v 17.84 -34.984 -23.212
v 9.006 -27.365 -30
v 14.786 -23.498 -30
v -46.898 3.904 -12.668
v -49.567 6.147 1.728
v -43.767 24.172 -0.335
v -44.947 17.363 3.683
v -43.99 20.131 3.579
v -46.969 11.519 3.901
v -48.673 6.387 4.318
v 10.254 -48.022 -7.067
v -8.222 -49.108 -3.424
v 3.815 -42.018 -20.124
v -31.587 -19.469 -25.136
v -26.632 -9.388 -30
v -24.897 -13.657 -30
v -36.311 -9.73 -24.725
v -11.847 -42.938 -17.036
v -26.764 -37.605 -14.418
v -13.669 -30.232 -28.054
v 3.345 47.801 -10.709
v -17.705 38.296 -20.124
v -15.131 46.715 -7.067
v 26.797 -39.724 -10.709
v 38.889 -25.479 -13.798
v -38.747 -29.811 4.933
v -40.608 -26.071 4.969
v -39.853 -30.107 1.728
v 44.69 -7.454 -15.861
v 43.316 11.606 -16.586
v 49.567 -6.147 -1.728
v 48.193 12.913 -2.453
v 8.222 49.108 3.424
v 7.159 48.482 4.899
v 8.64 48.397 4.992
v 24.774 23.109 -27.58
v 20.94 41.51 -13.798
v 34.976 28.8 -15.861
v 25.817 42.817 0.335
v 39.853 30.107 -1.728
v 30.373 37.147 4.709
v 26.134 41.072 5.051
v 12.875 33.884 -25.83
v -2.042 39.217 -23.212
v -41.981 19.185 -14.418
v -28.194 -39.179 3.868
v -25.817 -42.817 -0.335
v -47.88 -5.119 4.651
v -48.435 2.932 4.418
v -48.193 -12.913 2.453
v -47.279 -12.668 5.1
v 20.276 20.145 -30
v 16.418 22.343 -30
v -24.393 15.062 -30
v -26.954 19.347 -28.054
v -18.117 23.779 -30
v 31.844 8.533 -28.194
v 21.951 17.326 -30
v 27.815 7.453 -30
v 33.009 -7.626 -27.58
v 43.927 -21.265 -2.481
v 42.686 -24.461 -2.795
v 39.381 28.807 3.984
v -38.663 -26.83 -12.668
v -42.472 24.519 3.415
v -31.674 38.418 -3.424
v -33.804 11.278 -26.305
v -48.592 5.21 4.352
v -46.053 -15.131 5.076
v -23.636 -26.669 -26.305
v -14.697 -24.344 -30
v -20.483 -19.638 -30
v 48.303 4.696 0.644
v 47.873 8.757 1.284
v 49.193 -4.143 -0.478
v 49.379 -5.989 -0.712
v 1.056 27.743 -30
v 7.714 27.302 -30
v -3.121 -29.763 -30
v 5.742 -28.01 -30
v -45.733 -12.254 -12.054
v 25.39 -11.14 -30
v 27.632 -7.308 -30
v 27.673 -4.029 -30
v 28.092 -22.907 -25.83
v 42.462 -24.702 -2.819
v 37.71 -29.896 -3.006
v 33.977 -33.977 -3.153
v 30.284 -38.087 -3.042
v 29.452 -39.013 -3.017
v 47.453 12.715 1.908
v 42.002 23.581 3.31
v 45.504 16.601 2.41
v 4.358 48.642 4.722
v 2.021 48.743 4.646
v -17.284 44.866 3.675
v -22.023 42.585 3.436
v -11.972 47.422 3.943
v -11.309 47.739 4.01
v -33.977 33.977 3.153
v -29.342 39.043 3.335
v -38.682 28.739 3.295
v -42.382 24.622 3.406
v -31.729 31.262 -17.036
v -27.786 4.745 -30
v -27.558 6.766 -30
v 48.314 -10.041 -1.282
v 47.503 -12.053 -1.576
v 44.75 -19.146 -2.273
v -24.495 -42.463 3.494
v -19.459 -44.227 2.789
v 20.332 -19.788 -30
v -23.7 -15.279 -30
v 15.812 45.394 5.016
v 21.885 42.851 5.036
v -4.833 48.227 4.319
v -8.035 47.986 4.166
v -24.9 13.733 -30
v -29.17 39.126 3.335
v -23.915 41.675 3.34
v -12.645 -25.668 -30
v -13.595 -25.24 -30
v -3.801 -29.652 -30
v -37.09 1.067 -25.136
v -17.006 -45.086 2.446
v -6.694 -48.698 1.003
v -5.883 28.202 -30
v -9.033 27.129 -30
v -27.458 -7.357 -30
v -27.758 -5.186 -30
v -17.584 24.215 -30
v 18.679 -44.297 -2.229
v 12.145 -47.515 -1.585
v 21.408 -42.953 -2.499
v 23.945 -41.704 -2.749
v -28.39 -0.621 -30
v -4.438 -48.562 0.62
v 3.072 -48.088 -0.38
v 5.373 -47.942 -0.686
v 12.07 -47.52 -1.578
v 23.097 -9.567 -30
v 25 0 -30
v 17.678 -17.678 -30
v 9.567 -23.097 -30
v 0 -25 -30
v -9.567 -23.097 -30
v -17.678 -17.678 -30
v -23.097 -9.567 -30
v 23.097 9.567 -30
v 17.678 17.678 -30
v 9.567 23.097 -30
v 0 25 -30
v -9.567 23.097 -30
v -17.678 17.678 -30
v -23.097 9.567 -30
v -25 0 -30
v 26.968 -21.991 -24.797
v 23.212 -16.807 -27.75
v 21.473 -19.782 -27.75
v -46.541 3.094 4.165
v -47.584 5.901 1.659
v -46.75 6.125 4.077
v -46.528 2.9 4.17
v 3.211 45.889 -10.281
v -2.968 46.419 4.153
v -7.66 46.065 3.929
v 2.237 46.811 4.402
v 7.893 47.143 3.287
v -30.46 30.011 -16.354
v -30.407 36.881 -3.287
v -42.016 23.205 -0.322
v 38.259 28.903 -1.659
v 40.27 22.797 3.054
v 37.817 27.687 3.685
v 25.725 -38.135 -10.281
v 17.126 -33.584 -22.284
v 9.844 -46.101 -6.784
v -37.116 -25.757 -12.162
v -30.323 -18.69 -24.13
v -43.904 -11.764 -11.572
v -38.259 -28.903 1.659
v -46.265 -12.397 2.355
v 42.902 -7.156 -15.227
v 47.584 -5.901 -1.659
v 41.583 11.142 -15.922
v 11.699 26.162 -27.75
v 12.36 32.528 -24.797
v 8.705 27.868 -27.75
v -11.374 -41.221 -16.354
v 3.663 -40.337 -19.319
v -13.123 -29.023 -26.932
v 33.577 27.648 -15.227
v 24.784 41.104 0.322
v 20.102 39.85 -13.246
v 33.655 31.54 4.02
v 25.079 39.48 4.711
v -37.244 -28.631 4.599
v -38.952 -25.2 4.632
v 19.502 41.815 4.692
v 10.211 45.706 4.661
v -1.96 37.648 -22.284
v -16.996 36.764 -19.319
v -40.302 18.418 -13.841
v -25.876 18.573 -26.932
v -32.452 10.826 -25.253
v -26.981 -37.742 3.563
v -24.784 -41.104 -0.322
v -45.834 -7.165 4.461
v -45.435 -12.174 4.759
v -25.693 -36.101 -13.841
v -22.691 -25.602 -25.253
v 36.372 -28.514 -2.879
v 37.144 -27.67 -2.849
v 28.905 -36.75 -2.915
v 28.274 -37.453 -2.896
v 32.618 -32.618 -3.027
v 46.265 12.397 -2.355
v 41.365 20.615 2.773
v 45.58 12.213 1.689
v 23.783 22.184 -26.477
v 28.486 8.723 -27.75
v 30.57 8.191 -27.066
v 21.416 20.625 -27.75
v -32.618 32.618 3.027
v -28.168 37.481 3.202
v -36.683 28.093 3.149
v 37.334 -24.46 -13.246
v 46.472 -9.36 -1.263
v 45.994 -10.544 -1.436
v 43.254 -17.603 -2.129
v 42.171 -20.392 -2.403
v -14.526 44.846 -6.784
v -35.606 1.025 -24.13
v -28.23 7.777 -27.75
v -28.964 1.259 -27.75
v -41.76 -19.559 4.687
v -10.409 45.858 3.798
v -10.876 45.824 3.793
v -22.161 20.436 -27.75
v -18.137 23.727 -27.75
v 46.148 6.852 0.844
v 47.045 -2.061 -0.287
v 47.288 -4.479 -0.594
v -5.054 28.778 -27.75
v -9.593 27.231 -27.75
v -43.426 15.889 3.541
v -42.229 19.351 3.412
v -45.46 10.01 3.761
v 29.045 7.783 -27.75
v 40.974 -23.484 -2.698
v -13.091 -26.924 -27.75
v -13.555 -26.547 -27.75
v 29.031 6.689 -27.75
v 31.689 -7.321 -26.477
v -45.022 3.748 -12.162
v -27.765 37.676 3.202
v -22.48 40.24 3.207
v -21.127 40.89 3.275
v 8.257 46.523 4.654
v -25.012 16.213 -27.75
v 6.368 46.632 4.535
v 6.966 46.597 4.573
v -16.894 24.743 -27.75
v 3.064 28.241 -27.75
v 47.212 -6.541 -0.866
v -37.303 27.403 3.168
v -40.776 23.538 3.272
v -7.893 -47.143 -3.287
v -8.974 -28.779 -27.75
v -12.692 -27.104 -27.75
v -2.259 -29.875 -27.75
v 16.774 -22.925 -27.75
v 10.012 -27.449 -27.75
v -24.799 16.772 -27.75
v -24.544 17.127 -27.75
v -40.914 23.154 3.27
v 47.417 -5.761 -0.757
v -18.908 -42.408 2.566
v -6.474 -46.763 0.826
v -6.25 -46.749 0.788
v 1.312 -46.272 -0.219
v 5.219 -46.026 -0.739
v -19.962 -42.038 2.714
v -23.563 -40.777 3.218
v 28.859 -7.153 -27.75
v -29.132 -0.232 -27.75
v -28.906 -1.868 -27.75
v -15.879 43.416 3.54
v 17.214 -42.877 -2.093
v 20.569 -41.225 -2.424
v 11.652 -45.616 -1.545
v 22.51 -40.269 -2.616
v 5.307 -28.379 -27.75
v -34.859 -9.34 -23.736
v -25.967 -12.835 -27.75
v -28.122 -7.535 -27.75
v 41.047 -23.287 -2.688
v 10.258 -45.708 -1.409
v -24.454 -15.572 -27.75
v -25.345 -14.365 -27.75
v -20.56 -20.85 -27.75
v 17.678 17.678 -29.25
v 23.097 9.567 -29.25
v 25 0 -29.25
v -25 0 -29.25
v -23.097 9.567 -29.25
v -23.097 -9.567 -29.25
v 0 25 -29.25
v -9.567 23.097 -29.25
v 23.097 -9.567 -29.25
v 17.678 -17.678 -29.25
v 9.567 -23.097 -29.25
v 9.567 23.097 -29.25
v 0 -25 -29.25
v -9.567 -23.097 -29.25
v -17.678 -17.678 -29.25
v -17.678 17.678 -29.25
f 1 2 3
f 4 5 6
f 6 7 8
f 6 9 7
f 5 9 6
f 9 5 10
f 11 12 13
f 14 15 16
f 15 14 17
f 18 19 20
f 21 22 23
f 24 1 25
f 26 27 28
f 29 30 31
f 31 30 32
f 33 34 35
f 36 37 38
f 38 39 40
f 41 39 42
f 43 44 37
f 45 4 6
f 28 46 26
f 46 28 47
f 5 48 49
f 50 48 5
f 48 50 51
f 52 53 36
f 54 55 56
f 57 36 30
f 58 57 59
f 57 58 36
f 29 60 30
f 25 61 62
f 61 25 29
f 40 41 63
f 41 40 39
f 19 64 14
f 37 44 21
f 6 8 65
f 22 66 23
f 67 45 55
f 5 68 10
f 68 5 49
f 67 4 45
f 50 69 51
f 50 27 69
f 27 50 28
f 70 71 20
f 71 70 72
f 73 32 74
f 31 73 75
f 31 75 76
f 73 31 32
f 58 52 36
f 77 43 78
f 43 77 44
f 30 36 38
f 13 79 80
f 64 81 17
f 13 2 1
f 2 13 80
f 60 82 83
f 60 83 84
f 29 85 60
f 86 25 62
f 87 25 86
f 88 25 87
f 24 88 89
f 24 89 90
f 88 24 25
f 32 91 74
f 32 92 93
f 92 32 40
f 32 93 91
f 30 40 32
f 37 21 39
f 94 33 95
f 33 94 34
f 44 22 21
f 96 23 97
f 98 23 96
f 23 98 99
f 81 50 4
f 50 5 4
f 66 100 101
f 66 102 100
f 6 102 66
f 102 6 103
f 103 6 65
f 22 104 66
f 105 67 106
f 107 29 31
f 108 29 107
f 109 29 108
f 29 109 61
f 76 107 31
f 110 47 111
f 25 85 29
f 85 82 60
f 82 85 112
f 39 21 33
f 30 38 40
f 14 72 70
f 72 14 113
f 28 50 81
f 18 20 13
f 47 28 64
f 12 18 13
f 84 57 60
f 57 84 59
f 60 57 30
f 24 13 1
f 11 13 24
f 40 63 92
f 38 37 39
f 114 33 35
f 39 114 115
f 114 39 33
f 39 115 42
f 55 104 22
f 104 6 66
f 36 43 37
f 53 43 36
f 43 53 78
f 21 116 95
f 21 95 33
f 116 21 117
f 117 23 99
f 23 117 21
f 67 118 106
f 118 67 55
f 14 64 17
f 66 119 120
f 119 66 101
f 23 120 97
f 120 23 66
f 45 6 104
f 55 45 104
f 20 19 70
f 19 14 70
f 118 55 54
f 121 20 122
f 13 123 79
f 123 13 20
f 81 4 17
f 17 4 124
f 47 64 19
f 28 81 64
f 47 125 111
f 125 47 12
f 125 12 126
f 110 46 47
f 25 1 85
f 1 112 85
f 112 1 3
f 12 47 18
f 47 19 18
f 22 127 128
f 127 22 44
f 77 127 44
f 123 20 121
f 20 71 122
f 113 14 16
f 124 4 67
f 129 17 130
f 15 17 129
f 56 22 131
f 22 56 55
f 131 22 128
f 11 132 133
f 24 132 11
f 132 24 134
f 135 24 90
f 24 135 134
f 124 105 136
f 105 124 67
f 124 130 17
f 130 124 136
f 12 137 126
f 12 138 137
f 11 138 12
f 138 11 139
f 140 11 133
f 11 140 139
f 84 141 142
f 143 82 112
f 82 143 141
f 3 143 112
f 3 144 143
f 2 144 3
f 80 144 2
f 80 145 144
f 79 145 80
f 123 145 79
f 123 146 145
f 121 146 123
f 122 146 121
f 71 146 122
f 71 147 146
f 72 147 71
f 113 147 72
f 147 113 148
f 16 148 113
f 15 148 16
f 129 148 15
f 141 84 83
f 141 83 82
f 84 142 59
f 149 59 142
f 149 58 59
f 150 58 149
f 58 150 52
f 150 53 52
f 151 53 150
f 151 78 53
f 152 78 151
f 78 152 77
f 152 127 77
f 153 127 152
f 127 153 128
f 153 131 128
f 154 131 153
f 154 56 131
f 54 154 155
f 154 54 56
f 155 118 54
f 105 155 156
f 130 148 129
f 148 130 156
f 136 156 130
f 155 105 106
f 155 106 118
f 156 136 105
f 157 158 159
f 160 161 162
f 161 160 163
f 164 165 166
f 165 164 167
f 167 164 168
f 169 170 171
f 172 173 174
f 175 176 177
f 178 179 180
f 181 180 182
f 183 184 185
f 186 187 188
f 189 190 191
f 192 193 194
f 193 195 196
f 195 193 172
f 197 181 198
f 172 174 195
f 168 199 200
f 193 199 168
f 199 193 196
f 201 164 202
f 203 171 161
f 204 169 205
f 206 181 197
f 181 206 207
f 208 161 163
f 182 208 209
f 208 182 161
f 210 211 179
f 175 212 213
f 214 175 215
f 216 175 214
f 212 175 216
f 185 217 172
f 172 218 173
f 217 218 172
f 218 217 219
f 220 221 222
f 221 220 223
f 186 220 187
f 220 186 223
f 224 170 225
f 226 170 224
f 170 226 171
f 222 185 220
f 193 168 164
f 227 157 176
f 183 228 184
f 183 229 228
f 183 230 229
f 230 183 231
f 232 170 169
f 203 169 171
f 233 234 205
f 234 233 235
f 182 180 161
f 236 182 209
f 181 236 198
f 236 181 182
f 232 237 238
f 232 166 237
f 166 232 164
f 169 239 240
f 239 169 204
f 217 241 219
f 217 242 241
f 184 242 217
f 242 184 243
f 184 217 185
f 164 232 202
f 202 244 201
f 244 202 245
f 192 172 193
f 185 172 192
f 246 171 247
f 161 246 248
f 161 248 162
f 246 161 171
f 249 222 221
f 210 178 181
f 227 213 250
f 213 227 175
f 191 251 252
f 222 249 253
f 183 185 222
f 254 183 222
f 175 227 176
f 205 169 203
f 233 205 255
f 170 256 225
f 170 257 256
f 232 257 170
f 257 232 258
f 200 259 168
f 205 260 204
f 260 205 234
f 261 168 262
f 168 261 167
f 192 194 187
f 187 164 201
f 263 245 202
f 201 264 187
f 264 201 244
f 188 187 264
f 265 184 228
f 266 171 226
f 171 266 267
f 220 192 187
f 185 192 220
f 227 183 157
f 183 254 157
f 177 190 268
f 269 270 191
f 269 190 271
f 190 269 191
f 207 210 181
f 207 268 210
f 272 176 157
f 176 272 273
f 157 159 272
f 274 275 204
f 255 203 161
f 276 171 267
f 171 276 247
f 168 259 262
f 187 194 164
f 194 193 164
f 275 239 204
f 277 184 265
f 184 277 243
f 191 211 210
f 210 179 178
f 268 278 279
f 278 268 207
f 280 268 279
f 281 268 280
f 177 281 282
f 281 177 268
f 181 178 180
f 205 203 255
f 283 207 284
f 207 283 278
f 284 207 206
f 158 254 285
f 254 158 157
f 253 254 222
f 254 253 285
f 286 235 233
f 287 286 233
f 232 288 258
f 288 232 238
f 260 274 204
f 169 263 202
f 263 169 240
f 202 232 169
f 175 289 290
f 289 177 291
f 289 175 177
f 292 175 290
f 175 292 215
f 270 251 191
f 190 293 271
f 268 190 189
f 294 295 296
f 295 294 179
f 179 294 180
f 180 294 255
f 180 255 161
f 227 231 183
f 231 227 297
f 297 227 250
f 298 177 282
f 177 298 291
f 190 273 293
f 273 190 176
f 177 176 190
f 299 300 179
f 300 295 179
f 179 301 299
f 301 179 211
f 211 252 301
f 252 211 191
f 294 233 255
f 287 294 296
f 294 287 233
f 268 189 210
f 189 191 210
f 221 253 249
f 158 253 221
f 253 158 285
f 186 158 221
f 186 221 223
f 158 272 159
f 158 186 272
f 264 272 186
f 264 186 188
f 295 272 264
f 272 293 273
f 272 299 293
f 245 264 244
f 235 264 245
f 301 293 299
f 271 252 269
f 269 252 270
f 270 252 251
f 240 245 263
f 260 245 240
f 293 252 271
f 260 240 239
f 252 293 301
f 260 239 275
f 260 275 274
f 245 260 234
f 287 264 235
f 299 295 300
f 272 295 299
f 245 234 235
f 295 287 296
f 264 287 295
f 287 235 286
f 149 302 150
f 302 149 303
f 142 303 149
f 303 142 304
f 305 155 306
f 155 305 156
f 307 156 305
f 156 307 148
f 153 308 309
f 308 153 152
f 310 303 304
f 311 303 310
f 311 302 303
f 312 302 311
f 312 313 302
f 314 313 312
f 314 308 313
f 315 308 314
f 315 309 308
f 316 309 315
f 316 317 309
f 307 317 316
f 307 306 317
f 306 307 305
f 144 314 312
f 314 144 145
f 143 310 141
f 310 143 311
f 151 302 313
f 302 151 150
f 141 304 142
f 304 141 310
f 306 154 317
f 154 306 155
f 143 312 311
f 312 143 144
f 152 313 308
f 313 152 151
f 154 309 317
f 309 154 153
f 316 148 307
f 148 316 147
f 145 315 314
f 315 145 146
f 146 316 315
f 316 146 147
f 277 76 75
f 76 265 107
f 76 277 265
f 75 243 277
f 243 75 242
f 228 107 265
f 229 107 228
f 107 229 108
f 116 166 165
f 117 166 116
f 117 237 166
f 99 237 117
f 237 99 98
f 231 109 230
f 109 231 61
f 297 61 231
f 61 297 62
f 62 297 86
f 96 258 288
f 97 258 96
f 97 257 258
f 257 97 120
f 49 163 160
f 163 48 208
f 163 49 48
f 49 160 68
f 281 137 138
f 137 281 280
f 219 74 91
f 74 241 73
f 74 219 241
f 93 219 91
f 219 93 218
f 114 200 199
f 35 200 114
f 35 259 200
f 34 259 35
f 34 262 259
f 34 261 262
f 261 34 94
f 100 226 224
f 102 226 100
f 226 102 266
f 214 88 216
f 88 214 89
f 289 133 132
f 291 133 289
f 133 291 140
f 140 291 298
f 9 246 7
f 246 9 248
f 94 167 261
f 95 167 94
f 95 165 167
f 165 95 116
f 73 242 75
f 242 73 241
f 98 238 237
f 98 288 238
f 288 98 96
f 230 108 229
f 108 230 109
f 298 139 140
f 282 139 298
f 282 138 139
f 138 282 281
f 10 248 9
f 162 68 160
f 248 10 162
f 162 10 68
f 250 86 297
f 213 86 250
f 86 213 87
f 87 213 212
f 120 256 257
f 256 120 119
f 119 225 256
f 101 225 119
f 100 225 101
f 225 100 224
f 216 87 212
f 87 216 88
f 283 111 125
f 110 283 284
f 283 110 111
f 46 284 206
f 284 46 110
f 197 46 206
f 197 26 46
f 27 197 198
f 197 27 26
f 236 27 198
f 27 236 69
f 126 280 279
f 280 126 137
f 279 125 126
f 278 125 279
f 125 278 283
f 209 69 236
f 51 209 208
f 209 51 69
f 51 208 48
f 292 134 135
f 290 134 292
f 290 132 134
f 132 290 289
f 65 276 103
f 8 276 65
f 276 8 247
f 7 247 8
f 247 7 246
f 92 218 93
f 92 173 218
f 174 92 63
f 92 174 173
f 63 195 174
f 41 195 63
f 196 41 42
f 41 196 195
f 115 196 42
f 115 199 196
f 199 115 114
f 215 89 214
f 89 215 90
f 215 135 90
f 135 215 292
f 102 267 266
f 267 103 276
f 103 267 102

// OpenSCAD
// [FL_INDEX: keywords="openscad, 3d_parametric, Customizable_Bowl_Factory, csg_solid" | COT="Parametric OpenSCAD design from 3DCodeverse"]
// Title: Customizable Bowl Factory

/*
This work is licensed under the Creative Commons Attribution-NonCommercial-ShareAlike 3.0 Unported License. To view a copy of this license, visit http://creativecommons.org/licenses/by-nc-sa/3.0/

author: Eric Romano (@gelstudios on twitter)
title: Bowl Factory
about: these modules generate a bowl from a spherical section, with lots of parameters for customization.
version: 1.1

-------------------
module: bowl
description: generates a bowl, parameters are optional.
parameters: radius of bowl, wall thickness, wall spin, wall tilt, percent of bowl to retain after trimming the lip, angle of trim, z-angle of trim, resolution.
ex: bowl(60,3,.50,15,0,16);
note: higher resolutions look nice (32+), lower resolutions have a cool polygon look (try 5-16).

-------------------
module: prettycut
description: uses a cylinder to cut a rounded profile into the bowl. 
parameters: radius of cut, position of trim relative to center, angle of trim, z-angle of trim, resolution.
ex: prettycut(200,10,15,0,30)bowl(60,3,1,0,0,16);
note: prettycut is performed after the lip of the bowl is cut, so use 1 for bowl trim parameter if using it (see prettycut example). It looks best when the radius parameter is greater than the bowl's.
*/

BowlSize=50; //[10:300]
WallThickness=2; //[1:30]
//Higher values are "Smoother", Lower res has a cool polygon look.
BowlResolution=16; //[3:128]

CutType=1; //[0:Straight,1:Pretty]
CutAngle=5; //[0:90]
CutSpin=45; //[0:180]

//Percentage used by straight cut only
BowlTrim=50; //[0:100]
Trim=BowlTrim/100;

//Pretty cut only, zero is half way up the bowl.
PrettyCutOffset=0; //[-50:50]
PrettyCutResolution=100; //[3:128]
PrettyCutRadius=200; //[50:300]

/* [Shape] */
//Percentage
VerticalSquashOrStretch=75; //[25:300]
ZSquash=VerticalSquashOrStretch/100;
//Percentage
HorizontalSquashOrStretch=100; //[25:300]
YSquash=HorizontalSquashOrStretch/100;
//Percentage
DepthSquashOrStretch=100; //[25:300]
XSquash=DepthSquashOrStretch/100;

/* [Advanced] */
//Degrees
BowlWallSpin=15; //[0:180]
BowlWallXTilt=0; //[-90:90]
BowlWallYTilt=15; //[-90:90]


if (CutType==1){
	scale([XSquash,YSquash,ZSquash])
	prettycut(PrettyCutRadius,PrettyCutOffset,CutAngle,CutSpin,PrettyCutResolution)
	bowl(BowlSize,WallThickness,1,BowlWallSpin,BowlWallXTilt,BowlWallYTilt,0,0,BowlResolution);
} else {
	scale([XSquash,YSquash,ZSquash])
	bowl(BowlSize,WallThickness,Trim,BowlWallSpin,BowlWallXTilt,BowlWallYTilt,CutAngle,CutSpin,BowlResolution);
}

module bowl(size=50,wall=2,percenttrim=.60,spin=0,tilt=0,tilt2=0,cutangle=0,cutangle2=0,bowlres=50){
$fn=bowlres;
trimvol=2*size;
trimposition=trimvol*percenttrim;
trimbottom=size*.2;
bottomcut=size/2;
insphere=1-wall/size;

difference(){
	difference(){
		difference(){
			//outer wall
			intersection(){
				rotate([tilt,tilt2,spin])sphere(size);
				translate([0,0,trimbottom])
				cube([trimvol,trimvol,trimvol],center=true);
				}
			//inner wall
			intersection(){
				rotate([tilt,tilt2,spin])sphere(size*insphere);//rotate for face angle, need parameter
				translate([0,0,trimbottom*1.3])
				cube([trimvol,trimvol,trimvol],center=true);
				}
			}
		rotate([cutangle,0,cutangle2])
		translate([0,0,trimposition])
		cube([4*trimvol,4*trimvol,trimvol],center=true);
		}
	translate([0,0,-1.28*size])
	cylinder(bottomcut,bottomcut,bottomcut);
	}
}

module prettycut(pcutsize=200,offset=0,pcutangle=0,pcutangle2=0,pcutres=100){
$fn=pcutres;
radius=pcutsize;

difference(){
	child(0);

	translate([0,0,offset])
	rotate([pcutangle,0,pcutangle2])
	translate([0,0,radius])
	rotate([90,0,0])
	cylinder(4*radius,radius,radius,center=true);
	}
}
